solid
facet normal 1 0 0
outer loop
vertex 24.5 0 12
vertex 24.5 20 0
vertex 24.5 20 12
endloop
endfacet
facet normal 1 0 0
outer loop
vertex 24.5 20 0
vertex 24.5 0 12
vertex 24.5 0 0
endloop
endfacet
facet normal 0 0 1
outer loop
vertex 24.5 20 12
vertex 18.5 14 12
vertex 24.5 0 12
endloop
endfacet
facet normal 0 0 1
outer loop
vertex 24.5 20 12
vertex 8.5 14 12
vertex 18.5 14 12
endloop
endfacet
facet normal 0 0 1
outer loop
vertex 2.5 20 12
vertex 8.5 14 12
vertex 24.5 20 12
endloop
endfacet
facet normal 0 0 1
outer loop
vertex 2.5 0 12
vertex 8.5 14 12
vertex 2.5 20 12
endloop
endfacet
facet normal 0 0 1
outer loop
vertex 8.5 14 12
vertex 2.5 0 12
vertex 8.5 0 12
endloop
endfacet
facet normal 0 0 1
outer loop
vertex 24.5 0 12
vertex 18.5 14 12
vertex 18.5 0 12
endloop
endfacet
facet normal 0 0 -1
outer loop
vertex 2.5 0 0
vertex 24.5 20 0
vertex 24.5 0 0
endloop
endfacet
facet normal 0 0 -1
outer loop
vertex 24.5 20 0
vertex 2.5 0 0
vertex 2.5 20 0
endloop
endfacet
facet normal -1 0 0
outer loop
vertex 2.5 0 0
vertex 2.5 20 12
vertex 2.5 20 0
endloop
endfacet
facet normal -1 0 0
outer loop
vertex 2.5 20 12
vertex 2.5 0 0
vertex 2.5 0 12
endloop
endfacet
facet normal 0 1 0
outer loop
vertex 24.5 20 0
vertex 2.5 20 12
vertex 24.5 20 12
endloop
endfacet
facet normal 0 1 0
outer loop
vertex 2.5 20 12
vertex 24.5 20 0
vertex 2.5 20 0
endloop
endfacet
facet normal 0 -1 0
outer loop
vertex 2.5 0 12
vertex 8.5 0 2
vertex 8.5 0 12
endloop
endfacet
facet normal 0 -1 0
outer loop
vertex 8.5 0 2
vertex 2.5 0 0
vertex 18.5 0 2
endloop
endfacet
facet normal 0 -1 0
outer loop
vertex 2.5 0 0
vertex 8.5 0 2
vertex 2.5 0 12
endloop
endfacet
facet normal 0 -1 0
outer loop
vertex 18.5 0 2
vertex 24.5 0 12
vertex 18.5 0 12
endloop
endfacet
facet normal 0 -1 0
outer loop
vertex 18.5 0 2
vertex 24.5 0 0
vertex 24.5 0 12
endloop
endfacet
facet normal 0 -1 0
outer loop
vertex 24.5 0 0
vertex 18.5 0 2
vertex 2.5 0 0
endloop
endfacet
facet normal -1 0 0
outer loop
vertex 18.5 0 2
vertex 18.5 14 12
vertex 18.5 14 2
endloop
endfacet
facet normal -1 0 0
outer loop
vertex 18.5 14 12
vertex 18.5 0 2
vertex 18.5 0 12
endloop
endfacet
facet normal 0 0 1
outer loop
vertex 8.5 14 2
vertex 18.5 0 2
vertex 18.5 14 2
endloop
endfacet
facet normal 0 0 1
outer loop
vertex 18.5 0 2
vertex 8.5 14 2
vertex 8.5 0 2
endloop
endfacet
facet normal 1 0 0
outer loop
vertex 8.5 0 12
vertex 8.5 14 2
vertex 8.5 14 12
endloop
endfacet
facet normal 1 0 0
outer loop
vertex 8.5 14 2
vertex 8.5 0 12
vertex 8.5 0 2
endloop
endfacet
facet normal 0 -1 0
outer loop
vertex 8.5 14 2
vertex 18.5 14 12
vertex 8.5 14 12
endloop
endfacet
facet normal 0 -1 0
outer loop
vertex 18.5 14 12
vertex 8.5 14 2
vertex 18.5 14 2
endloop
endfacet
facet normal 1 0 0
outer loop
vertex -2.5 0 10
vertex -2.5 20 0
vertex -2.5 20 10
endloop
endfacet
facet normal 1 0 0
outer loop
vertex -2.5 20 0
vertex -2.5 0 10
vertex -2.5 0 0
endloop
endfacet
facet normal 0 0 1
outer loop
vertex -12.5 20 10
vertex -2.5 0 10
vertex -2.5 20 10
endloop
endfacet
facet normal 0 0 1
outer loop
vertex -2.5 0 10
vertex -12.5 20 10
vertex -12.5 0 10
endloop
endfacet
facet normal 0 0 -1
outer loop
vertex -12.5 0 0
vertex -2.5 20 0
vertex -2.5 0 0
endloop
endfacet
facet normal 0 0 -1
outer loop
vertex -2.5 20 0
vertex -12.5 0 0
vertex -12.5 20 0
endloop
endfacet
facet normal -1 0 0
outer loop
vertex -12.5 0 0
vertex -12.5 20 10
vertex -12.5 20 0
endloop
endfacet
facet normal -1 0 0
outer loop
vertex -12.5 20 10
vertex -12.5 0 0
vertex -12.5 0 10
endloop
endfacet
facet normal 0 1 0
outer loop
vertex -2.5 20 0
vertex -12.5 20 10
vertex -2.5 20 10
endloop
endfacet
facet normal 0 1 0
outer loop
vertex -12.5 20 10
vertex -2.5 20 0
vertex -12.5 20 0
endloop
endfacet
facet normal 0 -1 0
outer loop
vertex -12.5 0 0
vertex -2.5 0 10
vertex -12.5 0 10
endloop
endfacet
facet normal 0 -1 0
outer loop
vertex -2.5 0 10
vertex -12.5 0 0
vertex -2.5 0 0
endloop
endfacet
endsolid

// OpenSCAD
union () {
	difference() {
		translate([2.5,0,0]) cube([22,20,12]);
		translate([8.5,-1,2]) cube([10,15,11]);
	}
	translate([-12.5,0,0]) cube([10,20,10]);
}
